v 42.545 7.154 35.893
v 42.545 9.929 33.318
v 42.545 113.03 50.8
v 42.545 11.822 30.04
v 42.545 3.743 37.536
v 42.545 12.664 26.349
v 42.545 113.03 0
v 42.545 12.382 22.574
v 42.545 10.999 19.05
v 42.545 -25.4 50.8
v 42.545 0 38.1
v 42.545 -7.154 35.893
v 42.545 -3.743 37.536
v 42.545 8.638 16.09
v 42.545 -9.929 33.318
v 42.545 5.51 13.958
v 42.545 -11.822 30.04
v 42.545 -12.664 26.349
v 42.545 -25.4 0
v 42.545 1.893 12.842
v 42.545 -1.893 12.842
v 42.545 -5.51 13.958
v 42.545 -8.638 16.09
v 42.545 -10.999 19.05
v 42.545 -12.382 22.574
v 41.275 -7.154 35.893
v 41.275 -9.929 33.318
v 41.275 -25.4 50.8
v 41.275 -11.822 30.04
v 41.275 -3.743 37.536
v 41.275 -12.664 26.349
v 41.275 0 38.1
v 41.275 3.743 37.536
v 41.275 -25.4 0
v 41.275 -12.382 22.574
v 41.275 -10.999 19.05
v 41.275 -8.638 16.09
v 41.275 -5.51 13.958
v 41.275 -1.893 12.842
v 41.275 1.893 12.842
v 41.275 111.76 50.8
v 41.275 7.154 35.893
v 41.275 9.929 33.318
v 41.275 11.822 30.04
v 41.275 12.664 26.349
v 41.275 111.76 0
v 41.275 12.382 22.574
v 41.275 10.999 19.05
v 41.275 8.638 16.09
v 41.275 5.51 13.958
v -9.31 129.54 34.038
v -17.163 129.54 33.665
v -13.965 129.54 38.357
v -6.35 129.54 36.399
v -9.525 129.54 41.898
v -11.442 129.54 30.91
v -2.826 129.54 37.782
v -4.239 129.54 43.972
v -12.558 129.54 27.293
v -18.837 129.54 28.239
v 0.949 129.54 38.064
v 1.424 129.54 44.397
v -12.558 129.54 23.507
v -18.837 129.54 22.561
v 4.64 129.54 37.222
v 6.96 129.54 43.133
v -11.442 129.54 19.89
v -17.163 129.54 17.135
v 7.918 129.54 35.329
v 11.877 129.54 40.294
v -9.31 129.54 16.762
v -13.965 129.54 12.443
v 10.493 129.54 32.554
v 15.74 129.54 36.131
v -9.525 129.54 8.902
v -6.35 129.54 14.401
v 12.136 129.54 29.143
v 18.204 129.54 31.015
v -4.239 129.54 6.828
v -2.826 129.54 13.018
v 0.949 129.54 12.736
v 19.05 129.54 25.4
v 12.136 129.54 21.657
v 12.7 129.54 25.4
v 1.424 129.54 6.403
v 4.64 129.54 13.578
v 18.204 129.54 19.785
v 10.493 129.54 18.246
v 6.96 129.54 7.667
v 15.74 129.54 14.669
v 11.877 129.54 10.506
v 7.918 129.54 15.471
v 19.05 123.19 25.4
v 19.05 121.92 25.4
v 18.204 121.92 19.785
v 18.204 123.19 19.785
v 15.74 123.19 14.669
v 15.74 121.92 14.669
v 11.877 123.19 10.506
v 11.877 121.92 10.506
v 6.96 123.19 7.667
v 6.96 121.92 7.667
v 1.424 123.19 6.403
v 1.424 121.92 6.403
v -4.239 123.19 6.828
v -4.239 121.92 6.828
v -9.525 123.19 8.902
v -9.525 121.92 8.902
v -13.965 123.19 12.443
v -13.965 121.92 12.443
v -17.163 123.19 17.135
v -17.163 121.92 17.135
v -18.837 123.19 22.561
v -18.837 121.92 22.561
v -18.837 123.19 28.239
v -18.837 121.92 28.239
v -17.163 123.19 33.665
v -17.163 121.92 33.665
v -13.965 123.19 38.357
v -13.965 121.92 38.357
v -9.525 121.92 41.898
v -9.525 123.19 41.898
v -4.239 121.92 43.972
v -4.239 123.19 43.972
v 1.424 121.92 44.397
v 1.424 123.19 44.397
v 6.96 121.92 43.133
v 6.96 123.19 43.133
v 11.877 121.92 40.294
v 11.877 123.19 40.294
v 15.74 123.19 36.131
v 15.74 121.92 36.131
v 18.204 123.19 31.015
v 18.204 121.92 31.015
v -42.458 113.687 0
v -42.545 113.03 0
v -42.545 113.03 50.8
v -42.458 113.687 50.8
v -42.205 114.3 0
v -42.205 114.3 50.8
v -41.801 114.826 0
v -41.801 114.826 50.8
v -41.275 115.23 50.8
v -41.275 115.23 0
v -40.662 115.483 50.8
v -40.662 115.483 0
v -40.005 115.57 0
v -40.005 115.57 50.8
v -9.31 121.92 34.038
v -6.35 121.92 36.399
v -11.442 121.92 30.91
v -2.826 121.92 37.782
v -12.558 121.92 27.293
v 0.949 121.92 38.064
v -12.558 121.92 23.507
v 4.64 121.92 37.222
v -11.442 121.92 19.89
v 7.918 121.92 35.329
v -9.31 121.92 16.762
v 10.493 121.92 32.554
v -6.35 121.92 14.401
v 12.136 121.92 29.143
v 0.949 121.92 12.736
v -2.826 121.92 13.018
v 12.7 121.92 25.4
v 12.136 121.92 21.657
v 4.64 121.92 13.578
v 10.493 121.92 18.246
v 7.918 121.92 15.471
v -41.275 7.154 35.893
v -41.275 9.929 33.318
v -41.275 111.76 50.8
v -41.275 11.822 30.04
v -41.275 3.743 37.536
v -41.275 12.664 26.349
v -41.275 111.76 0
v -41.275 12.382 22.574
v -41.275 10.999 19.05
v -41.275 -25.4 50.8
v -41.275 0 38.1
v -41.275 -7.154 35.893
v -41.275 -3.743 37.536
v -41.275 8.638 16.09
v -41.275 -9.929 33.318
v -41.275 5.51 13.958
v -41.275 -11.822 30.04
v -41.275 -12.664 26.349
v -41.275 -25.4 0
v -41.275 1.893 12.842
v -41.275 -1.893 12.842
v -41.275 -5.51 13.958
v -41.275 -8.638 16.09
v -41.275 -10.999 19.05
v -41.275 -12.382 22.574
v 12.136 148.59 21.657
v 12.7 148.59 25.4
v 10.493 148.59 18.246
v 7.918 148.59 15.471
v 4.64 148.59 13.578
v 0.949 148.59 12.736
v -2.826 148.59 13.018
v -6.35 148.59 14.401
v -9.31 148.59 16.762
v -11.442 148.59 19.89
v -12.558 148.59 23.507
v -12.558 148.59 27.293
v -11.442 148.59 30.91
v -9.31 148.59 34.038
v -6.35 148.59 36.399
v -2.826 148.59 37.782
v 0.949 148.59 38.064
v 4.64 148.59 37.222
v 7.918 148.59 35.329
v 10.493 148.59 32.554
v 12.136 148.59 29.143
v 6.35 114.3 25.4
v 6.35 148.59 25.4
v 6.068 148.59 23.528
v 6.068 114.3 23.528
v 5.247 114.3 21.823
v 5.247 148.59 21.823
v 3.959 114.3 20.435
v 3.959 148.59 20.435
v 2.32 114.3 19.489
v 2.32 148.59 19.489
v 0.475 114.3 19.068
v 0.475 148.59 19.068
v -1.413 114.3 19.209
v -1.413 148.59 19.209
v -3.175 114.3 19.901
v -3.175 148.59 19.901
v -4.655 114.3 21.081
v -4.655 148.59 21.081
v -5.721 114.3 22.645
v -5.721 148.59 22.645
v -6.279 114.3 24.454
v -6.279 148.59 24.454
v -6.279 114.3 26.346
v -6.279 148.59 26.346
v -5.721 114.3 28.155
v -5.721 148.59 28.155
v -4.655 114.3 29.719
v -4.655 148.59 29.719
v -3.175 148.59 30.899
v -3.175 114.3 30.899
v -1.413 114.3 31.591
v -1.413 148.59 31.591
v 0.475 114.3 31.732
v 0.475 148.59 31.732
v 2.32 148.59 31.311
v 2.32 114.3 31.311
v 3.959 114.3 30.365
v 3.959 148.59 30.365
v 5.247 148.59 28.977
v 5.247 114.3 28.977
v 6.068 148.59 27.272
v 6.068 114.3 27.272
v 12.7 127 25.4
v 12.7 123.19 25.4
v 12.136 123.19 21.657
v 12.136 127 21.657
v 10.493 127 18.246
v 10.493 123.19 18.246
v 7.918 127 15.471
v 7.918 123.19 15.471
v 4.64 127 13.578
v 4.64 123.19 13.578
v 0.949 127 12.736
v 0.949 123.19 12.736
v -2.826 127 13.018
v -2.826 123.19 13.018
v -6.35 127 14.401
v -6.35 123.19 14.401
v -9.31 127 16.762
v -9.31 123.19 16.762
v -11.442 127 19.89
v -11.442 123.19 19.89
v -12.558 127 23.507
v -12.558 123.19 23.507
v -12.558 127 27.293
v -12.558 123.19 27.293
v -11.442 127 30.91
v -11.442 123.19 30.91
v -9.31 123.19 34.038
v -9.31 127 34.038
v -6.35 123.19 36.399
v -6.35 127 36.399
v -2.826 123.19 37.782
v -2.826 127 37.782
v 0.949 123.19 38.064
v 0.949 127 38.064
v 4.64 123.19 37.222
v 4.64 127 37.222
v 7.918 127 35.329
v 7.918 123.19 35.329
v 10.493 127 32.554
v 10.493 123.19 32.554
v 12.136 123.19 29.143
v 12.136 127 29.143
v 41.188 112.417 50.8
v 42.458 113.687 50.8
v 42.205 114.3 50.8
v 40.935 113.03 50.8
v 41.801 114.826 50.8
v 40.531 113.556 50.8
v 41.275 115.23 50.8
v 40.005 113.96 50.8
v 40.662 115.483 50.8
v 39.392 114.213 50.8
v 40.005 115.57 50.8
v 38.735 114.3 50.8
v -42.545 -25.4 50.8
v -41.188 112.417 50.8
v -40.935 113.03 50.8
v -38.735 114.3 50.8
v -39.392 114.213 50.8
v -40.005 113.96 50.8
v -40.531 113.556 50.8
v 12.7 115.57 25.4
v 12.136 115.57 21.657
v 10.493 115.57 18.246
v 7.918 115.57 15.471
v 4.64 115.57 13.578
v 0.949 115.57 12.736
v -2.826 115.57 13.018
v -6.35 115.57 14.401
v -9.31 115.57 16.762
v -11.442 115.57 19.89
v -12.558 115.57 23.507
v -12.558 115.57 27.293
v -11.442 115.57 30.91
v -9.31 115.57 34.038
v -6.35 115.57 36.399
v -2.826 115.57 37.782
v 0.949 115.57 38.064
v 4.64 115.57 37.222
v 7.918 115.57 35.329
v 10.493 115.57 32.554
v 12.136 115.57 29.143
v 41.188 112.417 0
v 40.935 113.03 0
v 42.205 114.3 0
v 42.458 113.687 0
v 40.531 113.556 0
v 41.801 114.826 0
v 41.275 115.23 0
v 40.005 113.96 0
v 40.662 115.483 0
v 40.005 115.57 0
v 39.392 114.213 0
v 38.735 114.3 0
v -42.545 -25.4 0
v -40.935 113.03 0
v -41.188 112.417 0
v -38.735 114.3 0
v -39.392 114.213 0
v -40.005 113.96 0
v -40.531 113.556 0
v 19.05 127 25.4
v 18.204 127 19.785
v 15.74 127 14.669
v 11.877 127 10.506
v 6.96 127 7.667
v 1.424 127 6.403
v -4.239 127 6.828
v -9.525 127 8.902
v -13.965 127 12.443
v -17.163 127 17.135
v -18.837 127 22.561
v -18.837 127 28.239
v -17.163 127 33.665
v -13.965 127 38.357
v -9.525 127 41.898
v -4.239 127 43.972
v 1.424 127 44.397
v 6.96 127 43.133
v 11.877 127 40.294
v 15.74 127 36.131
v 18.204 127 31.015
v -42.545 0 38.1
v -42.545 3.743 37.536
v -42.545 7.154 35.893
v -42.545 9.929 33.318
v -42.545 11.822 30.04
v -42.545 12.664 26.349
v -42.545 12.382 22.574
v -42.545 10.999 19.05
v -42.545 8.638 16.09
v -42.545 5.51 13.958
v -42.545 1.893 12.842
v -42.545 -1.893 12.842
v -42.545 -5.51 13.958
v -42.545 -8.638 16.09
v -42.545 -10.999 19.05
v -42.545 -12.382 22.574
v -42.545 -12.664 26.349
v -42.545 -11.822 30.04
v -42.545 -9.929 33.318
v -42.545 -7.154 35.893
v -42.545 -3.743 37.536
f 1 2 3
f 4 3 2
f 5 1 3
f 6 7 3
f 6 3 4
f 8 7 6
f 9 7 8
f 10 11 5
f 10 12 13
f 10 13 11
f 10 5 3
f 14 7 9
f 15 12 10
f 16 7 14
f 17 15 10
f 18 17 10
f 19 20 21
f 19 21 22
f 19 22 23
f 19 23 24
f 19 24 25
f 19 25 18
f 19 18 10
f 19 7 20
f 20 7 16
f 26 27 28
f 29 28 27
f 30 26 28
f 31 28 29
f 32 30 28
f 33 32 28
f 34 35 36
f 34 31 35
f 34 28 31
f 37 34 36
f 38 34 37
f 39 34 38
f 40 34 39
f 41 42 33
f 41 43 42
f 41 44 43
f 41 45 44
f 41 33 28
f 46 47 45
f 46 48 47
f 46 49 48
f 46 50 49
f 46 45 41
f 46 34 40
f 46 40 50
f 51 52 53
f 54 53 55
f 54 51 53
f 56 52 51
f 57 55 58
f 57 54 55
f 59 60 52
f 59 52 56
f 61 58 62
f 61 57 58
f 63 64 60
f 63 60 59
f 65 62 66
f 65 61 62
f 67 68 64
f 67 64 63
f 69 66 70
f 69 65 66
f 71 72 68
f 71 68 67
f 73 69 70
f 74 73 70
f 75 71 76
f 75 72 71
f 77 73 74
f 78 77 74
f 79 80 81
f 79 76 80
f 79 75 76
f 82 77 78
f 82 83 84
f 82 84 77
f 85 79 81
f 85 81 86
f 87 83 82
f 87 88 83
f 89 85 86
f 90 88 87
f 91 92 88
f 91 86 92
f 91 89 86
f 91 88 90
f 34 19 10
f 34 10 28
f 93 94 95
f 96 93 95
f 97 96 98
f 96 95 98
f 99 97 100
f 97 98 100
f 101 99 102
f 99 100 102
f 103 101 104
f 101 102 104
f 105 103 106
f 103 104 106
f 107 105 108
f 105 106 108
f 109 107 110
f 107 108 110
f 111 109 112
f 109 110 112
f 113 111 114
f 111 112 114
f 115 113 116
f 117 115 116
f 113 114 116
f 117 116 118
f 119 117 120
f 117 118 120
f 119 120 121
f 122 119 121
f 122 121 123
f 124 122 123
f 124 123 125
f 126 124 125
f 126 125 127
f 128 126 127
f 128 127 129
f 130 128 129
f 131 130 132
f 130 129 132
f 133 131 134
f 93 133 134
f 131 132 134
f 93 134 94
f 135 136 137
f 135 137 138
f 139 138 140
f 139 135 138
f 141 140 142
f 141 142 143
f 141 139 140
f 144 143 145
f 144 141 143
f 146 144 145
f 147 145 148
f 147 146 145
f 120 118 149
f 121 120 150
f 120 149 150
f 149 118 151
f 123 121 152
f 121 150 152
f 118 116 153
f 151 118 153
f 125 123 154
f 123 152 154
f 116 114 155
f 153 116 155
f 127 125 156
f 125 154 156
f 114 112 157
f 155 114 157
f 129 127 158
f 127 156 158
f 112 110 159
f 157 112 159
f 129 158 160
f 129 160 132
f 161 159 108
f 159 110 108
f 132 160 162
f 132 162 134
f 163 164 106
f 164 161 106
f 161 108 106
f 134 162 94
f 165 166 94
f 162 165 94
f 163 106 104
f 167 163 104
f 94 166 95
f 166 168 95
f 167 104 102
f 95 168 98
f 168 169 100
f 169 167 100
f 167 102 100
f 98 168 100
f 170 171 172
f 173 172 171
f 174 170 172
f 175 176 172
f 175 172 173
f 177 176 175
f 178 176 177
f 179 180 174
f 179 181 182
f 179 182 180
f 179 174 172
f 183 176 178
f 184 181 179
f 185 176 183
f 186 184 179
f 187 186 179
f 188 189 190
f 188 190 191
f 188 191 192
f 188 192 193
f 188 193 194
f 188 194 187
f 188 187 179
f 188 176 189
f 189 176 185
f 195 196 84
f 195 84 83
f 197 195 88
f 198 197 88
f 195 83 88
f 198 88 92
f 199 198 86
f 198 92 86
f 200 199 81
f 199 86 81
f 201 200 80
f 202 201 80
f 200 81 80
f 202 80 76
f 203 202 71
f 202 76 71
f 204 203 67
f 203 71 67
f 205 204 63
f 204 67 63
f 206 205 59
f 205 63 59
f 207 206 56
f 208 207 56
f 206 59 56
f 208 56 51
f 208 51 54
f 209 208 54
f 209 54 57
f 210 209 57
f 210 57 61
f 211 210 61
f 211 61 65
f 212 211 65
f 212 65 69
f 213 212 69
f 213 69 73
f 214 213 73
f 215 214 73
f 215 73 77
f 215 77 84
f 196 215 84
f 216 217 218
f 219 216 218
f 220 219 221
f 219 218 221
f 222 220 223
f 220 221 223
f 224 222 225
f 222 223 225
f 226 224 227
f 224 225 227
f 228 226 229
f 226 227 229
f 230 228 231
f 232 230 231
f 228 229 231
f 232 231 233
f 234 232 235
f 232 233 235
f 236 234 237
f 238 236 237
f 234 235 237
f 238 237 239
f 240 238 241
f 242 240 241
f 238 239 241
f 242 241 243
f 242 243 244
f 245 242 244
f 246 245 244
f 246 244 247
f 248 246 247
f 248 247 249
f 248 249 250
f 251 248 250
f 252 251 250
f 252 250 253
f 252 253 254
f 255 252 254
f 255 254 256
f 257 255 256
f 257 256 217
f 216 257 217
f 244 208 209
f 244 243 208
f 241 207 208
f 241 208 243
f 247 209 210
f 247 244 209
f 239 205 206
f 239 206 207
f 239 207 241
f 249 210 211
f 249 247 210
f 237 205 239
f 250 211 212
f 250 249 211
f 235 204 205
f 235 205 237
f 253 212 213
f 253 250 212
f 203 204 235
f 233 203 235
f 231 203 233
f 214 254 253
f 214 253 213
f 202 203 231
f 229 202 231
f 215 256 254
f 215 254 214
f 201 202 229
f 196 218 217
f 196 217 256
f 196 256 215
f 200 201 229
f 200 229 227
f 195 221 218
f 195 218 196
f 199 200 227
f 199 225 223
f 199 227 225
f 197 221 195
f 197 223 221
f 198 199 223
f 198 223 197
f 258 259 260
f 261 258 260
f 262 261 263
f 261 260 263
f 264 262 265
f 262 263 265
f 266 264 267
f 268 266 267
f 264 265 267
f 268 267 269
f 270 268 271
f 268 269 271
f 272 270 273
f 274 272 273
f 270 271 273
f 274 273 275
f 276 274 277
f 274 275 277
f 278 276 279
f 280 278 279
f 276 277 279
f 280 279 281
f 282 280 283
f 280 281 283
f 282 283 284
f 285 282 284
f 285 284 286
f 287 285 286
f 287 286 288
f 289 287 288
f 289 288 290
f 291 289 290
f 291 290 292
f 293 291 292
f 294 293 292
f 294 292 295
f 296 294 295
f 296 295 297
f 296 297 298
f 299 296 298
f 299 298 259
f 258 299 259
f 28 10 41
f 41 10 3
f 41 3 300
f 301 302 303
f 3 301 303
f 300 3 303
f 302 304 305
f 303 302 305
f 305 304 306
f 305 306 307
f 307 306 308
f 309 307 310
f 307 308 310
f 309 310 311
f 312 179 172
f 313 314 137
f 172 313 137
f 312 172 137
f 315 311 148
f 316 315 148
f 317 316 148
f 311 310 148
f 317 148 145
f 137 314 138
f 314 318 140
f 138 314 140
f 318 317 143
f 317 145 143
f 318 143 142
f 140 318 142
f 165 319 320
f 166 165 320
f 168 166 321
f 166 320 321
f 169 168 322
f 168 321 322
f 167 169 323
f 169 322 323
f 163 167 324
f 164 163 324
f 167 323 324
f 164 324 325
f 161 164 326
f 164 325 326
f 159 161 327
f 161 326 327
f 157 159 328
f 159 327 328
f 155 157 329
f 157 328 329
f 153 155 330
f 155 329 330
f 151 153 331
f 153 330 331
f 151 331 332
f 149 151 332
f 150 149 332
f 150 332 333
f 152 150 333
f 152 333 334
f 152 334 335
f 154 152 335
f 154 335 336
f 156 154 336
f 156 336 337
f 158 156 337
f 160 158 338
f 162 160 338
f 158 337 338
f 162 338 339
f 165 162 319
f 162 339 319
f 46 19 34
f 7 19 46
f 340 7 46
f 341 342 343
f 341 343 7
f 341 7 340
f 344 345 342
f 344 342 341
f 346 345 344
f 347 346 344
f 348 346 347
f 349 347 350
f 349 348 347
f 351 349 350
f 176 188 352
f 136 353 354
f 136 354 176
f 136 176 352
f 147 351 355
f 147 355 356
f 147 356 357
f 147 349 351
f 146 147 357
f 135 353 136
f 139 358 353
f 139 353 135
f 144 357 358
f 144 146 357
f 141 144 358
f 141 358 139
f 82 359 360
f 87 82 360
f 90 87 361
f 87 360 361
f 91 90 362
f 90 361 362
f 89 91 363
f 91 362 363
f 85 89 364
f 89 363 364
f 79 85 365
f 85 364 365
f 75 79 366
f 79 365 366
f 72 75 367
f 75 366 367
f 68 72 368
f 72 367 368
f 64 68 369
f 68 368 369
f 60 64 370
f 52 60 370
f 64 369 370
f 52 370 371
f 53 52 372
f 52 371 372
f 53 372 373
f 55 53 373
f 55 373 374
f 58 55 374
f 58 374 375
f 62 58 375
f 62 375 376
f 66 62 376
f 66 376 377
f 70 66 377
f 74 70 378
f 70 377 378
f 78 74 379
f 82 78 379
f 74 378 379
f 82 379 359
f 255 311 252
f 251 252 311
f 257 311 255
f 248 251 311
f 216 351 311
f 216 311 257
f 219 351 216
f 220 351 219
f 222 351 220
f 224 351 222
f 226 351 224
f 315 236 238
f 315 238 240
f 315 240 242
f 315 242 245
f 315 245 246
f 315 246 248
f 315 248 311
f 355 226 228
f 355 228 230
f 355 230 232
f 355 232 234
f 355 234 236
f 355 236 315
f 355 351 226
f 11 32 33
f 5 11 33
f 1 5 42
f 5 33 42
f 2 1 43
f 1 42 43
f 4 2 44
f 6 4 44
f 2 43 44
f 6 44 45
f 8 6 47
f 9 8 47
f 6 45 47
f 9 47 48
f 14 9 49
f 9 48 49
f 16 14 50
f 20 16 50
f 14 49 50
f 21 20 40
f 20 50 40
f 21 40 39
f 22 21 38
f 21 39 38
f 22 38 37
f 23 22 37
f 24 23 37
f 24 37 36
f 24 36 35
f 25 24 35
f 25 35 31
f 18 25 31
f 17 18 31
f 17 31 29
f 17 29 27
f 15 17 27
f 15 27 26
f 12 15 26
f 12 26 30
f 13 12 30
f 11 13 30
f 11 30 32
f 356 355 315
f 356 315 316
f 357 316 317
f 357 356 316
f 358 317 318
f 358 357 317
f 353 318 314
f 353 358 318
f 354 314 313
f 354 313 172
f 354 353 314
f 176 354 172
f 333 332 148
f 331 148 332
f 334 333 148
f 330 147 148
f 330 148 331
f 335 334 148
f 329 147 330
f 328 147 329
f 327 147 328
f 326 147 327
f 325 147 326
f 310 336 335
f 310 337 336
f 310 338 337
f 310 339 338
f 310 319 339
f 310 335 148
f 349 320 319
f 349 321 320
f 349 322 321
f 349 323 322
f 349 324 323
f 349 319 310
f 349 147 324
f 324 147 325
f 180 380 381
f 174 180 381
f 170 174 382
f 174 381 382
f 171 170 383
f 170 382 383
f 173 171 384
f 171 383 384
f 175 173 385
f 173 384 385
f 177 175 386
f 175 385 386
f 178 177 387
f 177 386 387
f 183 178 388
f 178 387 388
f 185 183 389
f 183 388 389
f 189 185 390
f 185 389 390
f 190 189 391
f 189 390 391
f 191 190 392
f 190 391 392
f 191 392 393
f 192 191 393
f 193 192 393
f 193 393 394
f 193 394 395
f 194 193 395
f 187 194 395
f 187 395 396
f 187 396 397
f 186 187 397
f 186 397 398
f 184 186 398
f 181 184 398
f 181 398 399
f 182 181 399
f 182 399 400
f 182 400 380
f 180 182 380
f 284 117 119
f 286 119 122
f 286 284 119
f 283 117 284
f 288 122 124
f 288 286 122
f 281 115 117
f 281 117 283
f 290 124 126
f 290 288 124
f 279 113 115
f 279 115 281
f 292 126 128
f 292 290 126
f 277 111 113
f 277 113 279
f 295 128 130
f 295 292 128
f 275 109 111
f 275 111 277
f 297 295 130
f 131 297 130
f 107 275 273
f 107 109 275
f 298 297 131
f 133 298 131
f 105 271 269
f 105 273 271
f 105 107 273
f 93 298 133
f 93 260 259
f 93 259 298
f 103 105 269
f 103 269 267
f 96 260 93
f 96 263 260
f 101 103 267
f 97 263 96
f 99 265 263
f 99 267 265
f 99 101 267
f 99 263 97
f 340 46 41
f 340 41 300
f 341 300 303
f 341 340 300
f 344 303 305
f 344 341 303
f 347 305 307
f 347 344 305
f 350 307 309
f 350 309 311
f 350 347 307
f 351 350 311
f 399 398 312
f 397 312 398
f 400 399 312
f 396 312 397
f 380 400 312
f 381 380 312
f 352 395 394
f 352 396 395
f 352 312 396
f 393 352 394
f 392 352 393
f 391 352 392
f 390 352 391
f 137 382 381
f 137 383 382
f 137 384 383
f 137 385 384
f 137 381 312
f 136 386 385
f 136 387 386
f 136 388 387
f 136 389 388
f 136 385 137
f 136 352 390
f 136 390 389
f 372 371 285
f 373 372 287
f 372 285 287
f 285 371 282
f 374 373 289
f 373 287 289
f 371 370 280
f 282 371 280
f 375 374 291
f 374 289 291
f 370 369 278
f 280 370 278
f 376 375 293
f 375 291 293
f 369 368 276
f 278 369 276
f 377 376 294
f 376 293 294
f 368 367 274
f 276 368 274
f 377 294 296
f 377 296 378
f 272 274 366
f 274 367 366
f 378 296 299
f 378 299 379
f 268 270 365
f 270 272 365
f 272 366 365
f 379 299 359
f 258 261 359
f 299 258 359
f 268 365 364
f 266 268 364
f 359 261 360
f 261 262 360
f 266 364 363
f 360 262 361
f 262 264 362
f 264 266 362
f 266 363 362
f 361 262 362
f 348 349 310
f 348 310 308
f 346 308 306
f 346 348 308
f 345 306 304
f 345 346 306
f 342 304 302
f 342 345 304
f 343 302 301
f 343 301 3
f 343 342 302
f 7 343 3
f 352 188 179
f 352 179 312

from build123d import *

# Parameters (mm, degrees)
BOSS_EXTRUDE1_DEPTH = 50.8
SKETCH2_R           = 12.7
CUT_EXTRUDE1_DEPTH  = 86.09
SKETCH3_R           = 12.7
BOSS_EXTRUDE2_DEPTH = 6.35
SKETCH4_R           = 19.05
BOSS_EXTRUDE3_DEPTH = 1.27
SKETCH5_R           = 12.7
BOSS_EXTRUDE4_DEPTH = 25.4
SKETCH6_R           = 6.35
CUT_EXTRUDE2_DEPTH  = 174.99
SKETCH7_R           = 19.05
SKETCH7_R_2         = 12.7
BOSS_EXTRUDE5_DEPTH = 2.54


with BuildPart() as part:
    # Sketch1 → Boss-Extrude1 (new body)
    with BuildSketch(Plane.XY):
        with BuildLine():
            Line((42.545, 113.03), (42.545, -25.4))
            Line((42.545, -25.4), (41.275, -25.4))
            Line((41.275, -25.4), (41.275, 111.76))
            ThreePointArc((41.275, 111.76), (40.531051224, 113.556051224), (38.735, 114.3))
            Line((38.735, 114.3), (-38.735, 114.3))
            ThreePointArc((-38.735, 114.3), (-40.531051224, 113.556051224), (-41.275, 111.76))
            Line((-41.275, 111.76), (-41.275, -25.4))
            Line((-41.275, -25.4), (-42.545, -25.4))
            Line((-42.545, -25.4), (-42.545, 113.03))
            ThreePointArc((-42.545, 113.03), (-41.801051224, 114.826051224), (-40.005, 115.57))
            Line((-40.005, 115.57), (40.005, 115.57))
            ThreePointArc((40.005, 115.57), (41.801051224, 114.826051224), (42.545, 113.03))
        make_face()
    extrude(amount=BOSS_EXTRUDE1_DEPTH)

    # Sketch2 → Cut-Extrude1 (cut, through all)
    with BuildSketch(Plane.ZY.offset(42.545)):
        with Locations((25.4, 0)):
            Circle(SKETCH2_R)
    extrude(amount=-CUT_EXTRUDE1_DEPTH, mode=Mode.SUBTRACT)

    # Sketch3 → Boss-Extrude2 (add)
    with BuildSketch(Plane(origin=(0, 115.57, 0), x_dir=(1, 0, 0), z_dir=(0, 1, 0))):
        with Locations((0, -25.4)):
            Circle(SKETCH3_R)
    extrude(amount=BOSS_EXTRUDE2_DEPTH)

    # Sketch4 → Boss-Extrude3 (add)
    with BuildSketch(Plane(origin=(0, 121.92, 0), x_dir=(1, 0, 0), z_dir=(0, 1, 0))):
        with Locations((0, -25.4)):
            Circle(SKETCH4_R)
    extrude(amount=BOSS_EXTRUDE3_DEPTH)

    # Sketch5 → Boss-Extrude4 (add)
    with BuildSketch(Plane(origin=(0, 123.19, 0), x_dir=(1, 0, 0), z_dir=(0, 1, 0))):
        with Locations((0, -25.4)):
            Circle(SKETCH5_R)
    extrude(amount=BOSS_EXTRUDE4_DEPTH)

    # Sketch6 → Cut-Extrude2 (cut, through all)
    with BuildSketch(Plane(origin=(0, 148.59, 0), x_dir=(1, 0, 0), z_dir=(0, 1, 0))):
        with Locations((0, -25.4)):
            Circle(SKETCH6_R)
    extrude(amount=-CUT_EXTRUDE2_DEPTH, mode=Mode.SUBTRACT)

    # Sketch7 → Boss-Extrude5 (add)
    with BuildSketch(Plane(origin=(0, 127, 0), x_dir=(1, 0, 0), z_dir=(0, 1, 0))):
        with Locations((0, -25.4)):
            Circle(SKETCH7_R)
        with Locations((0, -25.4)):
            Circle(SKETCH7_R_2, mode=Mode.SUBTRACT)
    extrude(amount=BOSS_EXTRUDE5_DEPTH)


solid = part.part
